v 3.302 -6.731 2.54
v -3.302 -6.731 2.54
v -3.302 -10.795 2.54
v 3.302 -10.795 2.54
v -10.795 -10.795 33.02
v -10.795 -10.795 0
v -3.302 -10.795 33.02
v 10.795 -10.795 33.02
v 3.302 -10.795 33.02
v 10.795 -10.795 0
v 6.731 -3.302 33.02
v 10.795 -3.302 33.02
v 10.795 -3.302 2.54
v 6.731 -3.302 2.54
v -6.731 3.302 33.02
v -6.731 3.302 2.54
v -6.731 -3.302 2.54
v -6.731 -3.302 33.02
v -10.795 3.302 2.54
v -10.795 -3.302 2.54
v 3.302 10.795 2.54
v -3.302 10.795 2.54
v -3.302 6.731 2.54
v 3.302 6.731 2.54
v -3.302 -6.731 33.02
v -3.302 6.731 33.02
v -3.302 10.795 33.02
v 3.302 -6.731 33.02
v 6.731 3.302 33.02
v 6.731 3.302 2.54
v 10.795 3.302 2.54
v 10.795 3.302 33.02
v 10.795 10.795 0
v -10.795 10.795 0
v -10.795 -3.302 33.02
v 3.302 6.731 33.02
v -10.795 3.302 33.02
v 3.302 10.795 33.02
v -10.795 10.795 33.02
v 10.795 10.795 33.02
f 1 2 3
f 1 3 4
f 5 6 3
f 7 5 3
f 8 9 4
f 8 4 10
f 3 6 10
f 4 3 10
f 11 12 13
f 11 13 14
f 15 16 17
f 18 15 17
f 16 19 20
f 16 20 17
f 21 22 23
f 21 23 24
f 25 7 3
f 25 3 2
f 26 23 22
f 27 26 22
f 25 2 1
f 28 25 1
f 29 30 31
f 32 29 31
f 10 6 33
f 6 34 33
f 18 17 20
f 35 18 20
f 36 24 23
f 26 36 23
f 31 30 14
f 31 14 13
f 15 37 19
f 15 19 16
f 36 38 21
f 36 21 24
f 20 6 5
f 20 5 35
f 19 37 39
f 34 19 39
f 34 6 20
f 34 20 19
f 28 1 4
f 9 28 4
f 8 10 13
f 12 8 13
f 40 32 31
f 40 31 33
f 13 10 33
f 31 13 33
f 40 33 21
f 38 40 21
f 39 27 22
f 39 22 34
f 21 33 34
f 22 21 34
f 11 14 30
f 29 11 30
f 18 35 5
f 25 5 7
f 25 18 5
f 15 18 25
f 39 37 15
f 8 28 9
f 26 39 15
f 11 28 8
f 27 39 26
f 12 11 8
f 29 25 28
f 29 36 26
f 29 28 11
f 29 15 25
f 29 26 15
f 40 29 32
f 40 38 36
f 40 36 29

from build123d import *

# Parameters (mm, degrees)
F1_DEPTH = 33.02
F0_W     = 4.064
F0_H     = 6.604
F0_W_2   = 6.604
F0_H_2   = 4.064
F2_DEPTH = 2.54


with BuildPart() as f1:
    # F0 (on Top) → F1 (new body)
    with BuildSketch(Plane.XY):
        Polygon((-3.302, 10.795), (-10.795, 10.795), (-10.795, 3.302), (-6.731, 3.302), (-6.731, -3.302), (-10.795, -3.302), (-10.795, -10.795), (-3.302, -10.795), (-3.302, -6.731), (3.302, -6.731), (3.302, -10.795), (10.795, -10.795), (10.795, -3.302), (6.731, -3.302), (6.731, 3.302), (10.795, 3.302), (10.795, 10.795), (3.302, 10.795), (3.302, 6.731), (-3.302, 6.731), align=None)
    extrude(amount=F1_DEPTH)

    # F0 (on Top) → F2 (join)
    with BuildSketch(Plane.XY):
        with Locations((-8.763, 0)):
            Rectangle(F0_W, F0_H)
        with Locations((0, 8.763)):
            Rectangle(F0_W_2, F0_H_2)
        with Locations((8.763, 0)):
            Rectangle(F0_W, F0_H)
        with Locations((0, -8.763)):
            Rectangle(F0_W_2, F0_H_2)
    extrude(amount=F2_DEPTH)


solid = f1.part
